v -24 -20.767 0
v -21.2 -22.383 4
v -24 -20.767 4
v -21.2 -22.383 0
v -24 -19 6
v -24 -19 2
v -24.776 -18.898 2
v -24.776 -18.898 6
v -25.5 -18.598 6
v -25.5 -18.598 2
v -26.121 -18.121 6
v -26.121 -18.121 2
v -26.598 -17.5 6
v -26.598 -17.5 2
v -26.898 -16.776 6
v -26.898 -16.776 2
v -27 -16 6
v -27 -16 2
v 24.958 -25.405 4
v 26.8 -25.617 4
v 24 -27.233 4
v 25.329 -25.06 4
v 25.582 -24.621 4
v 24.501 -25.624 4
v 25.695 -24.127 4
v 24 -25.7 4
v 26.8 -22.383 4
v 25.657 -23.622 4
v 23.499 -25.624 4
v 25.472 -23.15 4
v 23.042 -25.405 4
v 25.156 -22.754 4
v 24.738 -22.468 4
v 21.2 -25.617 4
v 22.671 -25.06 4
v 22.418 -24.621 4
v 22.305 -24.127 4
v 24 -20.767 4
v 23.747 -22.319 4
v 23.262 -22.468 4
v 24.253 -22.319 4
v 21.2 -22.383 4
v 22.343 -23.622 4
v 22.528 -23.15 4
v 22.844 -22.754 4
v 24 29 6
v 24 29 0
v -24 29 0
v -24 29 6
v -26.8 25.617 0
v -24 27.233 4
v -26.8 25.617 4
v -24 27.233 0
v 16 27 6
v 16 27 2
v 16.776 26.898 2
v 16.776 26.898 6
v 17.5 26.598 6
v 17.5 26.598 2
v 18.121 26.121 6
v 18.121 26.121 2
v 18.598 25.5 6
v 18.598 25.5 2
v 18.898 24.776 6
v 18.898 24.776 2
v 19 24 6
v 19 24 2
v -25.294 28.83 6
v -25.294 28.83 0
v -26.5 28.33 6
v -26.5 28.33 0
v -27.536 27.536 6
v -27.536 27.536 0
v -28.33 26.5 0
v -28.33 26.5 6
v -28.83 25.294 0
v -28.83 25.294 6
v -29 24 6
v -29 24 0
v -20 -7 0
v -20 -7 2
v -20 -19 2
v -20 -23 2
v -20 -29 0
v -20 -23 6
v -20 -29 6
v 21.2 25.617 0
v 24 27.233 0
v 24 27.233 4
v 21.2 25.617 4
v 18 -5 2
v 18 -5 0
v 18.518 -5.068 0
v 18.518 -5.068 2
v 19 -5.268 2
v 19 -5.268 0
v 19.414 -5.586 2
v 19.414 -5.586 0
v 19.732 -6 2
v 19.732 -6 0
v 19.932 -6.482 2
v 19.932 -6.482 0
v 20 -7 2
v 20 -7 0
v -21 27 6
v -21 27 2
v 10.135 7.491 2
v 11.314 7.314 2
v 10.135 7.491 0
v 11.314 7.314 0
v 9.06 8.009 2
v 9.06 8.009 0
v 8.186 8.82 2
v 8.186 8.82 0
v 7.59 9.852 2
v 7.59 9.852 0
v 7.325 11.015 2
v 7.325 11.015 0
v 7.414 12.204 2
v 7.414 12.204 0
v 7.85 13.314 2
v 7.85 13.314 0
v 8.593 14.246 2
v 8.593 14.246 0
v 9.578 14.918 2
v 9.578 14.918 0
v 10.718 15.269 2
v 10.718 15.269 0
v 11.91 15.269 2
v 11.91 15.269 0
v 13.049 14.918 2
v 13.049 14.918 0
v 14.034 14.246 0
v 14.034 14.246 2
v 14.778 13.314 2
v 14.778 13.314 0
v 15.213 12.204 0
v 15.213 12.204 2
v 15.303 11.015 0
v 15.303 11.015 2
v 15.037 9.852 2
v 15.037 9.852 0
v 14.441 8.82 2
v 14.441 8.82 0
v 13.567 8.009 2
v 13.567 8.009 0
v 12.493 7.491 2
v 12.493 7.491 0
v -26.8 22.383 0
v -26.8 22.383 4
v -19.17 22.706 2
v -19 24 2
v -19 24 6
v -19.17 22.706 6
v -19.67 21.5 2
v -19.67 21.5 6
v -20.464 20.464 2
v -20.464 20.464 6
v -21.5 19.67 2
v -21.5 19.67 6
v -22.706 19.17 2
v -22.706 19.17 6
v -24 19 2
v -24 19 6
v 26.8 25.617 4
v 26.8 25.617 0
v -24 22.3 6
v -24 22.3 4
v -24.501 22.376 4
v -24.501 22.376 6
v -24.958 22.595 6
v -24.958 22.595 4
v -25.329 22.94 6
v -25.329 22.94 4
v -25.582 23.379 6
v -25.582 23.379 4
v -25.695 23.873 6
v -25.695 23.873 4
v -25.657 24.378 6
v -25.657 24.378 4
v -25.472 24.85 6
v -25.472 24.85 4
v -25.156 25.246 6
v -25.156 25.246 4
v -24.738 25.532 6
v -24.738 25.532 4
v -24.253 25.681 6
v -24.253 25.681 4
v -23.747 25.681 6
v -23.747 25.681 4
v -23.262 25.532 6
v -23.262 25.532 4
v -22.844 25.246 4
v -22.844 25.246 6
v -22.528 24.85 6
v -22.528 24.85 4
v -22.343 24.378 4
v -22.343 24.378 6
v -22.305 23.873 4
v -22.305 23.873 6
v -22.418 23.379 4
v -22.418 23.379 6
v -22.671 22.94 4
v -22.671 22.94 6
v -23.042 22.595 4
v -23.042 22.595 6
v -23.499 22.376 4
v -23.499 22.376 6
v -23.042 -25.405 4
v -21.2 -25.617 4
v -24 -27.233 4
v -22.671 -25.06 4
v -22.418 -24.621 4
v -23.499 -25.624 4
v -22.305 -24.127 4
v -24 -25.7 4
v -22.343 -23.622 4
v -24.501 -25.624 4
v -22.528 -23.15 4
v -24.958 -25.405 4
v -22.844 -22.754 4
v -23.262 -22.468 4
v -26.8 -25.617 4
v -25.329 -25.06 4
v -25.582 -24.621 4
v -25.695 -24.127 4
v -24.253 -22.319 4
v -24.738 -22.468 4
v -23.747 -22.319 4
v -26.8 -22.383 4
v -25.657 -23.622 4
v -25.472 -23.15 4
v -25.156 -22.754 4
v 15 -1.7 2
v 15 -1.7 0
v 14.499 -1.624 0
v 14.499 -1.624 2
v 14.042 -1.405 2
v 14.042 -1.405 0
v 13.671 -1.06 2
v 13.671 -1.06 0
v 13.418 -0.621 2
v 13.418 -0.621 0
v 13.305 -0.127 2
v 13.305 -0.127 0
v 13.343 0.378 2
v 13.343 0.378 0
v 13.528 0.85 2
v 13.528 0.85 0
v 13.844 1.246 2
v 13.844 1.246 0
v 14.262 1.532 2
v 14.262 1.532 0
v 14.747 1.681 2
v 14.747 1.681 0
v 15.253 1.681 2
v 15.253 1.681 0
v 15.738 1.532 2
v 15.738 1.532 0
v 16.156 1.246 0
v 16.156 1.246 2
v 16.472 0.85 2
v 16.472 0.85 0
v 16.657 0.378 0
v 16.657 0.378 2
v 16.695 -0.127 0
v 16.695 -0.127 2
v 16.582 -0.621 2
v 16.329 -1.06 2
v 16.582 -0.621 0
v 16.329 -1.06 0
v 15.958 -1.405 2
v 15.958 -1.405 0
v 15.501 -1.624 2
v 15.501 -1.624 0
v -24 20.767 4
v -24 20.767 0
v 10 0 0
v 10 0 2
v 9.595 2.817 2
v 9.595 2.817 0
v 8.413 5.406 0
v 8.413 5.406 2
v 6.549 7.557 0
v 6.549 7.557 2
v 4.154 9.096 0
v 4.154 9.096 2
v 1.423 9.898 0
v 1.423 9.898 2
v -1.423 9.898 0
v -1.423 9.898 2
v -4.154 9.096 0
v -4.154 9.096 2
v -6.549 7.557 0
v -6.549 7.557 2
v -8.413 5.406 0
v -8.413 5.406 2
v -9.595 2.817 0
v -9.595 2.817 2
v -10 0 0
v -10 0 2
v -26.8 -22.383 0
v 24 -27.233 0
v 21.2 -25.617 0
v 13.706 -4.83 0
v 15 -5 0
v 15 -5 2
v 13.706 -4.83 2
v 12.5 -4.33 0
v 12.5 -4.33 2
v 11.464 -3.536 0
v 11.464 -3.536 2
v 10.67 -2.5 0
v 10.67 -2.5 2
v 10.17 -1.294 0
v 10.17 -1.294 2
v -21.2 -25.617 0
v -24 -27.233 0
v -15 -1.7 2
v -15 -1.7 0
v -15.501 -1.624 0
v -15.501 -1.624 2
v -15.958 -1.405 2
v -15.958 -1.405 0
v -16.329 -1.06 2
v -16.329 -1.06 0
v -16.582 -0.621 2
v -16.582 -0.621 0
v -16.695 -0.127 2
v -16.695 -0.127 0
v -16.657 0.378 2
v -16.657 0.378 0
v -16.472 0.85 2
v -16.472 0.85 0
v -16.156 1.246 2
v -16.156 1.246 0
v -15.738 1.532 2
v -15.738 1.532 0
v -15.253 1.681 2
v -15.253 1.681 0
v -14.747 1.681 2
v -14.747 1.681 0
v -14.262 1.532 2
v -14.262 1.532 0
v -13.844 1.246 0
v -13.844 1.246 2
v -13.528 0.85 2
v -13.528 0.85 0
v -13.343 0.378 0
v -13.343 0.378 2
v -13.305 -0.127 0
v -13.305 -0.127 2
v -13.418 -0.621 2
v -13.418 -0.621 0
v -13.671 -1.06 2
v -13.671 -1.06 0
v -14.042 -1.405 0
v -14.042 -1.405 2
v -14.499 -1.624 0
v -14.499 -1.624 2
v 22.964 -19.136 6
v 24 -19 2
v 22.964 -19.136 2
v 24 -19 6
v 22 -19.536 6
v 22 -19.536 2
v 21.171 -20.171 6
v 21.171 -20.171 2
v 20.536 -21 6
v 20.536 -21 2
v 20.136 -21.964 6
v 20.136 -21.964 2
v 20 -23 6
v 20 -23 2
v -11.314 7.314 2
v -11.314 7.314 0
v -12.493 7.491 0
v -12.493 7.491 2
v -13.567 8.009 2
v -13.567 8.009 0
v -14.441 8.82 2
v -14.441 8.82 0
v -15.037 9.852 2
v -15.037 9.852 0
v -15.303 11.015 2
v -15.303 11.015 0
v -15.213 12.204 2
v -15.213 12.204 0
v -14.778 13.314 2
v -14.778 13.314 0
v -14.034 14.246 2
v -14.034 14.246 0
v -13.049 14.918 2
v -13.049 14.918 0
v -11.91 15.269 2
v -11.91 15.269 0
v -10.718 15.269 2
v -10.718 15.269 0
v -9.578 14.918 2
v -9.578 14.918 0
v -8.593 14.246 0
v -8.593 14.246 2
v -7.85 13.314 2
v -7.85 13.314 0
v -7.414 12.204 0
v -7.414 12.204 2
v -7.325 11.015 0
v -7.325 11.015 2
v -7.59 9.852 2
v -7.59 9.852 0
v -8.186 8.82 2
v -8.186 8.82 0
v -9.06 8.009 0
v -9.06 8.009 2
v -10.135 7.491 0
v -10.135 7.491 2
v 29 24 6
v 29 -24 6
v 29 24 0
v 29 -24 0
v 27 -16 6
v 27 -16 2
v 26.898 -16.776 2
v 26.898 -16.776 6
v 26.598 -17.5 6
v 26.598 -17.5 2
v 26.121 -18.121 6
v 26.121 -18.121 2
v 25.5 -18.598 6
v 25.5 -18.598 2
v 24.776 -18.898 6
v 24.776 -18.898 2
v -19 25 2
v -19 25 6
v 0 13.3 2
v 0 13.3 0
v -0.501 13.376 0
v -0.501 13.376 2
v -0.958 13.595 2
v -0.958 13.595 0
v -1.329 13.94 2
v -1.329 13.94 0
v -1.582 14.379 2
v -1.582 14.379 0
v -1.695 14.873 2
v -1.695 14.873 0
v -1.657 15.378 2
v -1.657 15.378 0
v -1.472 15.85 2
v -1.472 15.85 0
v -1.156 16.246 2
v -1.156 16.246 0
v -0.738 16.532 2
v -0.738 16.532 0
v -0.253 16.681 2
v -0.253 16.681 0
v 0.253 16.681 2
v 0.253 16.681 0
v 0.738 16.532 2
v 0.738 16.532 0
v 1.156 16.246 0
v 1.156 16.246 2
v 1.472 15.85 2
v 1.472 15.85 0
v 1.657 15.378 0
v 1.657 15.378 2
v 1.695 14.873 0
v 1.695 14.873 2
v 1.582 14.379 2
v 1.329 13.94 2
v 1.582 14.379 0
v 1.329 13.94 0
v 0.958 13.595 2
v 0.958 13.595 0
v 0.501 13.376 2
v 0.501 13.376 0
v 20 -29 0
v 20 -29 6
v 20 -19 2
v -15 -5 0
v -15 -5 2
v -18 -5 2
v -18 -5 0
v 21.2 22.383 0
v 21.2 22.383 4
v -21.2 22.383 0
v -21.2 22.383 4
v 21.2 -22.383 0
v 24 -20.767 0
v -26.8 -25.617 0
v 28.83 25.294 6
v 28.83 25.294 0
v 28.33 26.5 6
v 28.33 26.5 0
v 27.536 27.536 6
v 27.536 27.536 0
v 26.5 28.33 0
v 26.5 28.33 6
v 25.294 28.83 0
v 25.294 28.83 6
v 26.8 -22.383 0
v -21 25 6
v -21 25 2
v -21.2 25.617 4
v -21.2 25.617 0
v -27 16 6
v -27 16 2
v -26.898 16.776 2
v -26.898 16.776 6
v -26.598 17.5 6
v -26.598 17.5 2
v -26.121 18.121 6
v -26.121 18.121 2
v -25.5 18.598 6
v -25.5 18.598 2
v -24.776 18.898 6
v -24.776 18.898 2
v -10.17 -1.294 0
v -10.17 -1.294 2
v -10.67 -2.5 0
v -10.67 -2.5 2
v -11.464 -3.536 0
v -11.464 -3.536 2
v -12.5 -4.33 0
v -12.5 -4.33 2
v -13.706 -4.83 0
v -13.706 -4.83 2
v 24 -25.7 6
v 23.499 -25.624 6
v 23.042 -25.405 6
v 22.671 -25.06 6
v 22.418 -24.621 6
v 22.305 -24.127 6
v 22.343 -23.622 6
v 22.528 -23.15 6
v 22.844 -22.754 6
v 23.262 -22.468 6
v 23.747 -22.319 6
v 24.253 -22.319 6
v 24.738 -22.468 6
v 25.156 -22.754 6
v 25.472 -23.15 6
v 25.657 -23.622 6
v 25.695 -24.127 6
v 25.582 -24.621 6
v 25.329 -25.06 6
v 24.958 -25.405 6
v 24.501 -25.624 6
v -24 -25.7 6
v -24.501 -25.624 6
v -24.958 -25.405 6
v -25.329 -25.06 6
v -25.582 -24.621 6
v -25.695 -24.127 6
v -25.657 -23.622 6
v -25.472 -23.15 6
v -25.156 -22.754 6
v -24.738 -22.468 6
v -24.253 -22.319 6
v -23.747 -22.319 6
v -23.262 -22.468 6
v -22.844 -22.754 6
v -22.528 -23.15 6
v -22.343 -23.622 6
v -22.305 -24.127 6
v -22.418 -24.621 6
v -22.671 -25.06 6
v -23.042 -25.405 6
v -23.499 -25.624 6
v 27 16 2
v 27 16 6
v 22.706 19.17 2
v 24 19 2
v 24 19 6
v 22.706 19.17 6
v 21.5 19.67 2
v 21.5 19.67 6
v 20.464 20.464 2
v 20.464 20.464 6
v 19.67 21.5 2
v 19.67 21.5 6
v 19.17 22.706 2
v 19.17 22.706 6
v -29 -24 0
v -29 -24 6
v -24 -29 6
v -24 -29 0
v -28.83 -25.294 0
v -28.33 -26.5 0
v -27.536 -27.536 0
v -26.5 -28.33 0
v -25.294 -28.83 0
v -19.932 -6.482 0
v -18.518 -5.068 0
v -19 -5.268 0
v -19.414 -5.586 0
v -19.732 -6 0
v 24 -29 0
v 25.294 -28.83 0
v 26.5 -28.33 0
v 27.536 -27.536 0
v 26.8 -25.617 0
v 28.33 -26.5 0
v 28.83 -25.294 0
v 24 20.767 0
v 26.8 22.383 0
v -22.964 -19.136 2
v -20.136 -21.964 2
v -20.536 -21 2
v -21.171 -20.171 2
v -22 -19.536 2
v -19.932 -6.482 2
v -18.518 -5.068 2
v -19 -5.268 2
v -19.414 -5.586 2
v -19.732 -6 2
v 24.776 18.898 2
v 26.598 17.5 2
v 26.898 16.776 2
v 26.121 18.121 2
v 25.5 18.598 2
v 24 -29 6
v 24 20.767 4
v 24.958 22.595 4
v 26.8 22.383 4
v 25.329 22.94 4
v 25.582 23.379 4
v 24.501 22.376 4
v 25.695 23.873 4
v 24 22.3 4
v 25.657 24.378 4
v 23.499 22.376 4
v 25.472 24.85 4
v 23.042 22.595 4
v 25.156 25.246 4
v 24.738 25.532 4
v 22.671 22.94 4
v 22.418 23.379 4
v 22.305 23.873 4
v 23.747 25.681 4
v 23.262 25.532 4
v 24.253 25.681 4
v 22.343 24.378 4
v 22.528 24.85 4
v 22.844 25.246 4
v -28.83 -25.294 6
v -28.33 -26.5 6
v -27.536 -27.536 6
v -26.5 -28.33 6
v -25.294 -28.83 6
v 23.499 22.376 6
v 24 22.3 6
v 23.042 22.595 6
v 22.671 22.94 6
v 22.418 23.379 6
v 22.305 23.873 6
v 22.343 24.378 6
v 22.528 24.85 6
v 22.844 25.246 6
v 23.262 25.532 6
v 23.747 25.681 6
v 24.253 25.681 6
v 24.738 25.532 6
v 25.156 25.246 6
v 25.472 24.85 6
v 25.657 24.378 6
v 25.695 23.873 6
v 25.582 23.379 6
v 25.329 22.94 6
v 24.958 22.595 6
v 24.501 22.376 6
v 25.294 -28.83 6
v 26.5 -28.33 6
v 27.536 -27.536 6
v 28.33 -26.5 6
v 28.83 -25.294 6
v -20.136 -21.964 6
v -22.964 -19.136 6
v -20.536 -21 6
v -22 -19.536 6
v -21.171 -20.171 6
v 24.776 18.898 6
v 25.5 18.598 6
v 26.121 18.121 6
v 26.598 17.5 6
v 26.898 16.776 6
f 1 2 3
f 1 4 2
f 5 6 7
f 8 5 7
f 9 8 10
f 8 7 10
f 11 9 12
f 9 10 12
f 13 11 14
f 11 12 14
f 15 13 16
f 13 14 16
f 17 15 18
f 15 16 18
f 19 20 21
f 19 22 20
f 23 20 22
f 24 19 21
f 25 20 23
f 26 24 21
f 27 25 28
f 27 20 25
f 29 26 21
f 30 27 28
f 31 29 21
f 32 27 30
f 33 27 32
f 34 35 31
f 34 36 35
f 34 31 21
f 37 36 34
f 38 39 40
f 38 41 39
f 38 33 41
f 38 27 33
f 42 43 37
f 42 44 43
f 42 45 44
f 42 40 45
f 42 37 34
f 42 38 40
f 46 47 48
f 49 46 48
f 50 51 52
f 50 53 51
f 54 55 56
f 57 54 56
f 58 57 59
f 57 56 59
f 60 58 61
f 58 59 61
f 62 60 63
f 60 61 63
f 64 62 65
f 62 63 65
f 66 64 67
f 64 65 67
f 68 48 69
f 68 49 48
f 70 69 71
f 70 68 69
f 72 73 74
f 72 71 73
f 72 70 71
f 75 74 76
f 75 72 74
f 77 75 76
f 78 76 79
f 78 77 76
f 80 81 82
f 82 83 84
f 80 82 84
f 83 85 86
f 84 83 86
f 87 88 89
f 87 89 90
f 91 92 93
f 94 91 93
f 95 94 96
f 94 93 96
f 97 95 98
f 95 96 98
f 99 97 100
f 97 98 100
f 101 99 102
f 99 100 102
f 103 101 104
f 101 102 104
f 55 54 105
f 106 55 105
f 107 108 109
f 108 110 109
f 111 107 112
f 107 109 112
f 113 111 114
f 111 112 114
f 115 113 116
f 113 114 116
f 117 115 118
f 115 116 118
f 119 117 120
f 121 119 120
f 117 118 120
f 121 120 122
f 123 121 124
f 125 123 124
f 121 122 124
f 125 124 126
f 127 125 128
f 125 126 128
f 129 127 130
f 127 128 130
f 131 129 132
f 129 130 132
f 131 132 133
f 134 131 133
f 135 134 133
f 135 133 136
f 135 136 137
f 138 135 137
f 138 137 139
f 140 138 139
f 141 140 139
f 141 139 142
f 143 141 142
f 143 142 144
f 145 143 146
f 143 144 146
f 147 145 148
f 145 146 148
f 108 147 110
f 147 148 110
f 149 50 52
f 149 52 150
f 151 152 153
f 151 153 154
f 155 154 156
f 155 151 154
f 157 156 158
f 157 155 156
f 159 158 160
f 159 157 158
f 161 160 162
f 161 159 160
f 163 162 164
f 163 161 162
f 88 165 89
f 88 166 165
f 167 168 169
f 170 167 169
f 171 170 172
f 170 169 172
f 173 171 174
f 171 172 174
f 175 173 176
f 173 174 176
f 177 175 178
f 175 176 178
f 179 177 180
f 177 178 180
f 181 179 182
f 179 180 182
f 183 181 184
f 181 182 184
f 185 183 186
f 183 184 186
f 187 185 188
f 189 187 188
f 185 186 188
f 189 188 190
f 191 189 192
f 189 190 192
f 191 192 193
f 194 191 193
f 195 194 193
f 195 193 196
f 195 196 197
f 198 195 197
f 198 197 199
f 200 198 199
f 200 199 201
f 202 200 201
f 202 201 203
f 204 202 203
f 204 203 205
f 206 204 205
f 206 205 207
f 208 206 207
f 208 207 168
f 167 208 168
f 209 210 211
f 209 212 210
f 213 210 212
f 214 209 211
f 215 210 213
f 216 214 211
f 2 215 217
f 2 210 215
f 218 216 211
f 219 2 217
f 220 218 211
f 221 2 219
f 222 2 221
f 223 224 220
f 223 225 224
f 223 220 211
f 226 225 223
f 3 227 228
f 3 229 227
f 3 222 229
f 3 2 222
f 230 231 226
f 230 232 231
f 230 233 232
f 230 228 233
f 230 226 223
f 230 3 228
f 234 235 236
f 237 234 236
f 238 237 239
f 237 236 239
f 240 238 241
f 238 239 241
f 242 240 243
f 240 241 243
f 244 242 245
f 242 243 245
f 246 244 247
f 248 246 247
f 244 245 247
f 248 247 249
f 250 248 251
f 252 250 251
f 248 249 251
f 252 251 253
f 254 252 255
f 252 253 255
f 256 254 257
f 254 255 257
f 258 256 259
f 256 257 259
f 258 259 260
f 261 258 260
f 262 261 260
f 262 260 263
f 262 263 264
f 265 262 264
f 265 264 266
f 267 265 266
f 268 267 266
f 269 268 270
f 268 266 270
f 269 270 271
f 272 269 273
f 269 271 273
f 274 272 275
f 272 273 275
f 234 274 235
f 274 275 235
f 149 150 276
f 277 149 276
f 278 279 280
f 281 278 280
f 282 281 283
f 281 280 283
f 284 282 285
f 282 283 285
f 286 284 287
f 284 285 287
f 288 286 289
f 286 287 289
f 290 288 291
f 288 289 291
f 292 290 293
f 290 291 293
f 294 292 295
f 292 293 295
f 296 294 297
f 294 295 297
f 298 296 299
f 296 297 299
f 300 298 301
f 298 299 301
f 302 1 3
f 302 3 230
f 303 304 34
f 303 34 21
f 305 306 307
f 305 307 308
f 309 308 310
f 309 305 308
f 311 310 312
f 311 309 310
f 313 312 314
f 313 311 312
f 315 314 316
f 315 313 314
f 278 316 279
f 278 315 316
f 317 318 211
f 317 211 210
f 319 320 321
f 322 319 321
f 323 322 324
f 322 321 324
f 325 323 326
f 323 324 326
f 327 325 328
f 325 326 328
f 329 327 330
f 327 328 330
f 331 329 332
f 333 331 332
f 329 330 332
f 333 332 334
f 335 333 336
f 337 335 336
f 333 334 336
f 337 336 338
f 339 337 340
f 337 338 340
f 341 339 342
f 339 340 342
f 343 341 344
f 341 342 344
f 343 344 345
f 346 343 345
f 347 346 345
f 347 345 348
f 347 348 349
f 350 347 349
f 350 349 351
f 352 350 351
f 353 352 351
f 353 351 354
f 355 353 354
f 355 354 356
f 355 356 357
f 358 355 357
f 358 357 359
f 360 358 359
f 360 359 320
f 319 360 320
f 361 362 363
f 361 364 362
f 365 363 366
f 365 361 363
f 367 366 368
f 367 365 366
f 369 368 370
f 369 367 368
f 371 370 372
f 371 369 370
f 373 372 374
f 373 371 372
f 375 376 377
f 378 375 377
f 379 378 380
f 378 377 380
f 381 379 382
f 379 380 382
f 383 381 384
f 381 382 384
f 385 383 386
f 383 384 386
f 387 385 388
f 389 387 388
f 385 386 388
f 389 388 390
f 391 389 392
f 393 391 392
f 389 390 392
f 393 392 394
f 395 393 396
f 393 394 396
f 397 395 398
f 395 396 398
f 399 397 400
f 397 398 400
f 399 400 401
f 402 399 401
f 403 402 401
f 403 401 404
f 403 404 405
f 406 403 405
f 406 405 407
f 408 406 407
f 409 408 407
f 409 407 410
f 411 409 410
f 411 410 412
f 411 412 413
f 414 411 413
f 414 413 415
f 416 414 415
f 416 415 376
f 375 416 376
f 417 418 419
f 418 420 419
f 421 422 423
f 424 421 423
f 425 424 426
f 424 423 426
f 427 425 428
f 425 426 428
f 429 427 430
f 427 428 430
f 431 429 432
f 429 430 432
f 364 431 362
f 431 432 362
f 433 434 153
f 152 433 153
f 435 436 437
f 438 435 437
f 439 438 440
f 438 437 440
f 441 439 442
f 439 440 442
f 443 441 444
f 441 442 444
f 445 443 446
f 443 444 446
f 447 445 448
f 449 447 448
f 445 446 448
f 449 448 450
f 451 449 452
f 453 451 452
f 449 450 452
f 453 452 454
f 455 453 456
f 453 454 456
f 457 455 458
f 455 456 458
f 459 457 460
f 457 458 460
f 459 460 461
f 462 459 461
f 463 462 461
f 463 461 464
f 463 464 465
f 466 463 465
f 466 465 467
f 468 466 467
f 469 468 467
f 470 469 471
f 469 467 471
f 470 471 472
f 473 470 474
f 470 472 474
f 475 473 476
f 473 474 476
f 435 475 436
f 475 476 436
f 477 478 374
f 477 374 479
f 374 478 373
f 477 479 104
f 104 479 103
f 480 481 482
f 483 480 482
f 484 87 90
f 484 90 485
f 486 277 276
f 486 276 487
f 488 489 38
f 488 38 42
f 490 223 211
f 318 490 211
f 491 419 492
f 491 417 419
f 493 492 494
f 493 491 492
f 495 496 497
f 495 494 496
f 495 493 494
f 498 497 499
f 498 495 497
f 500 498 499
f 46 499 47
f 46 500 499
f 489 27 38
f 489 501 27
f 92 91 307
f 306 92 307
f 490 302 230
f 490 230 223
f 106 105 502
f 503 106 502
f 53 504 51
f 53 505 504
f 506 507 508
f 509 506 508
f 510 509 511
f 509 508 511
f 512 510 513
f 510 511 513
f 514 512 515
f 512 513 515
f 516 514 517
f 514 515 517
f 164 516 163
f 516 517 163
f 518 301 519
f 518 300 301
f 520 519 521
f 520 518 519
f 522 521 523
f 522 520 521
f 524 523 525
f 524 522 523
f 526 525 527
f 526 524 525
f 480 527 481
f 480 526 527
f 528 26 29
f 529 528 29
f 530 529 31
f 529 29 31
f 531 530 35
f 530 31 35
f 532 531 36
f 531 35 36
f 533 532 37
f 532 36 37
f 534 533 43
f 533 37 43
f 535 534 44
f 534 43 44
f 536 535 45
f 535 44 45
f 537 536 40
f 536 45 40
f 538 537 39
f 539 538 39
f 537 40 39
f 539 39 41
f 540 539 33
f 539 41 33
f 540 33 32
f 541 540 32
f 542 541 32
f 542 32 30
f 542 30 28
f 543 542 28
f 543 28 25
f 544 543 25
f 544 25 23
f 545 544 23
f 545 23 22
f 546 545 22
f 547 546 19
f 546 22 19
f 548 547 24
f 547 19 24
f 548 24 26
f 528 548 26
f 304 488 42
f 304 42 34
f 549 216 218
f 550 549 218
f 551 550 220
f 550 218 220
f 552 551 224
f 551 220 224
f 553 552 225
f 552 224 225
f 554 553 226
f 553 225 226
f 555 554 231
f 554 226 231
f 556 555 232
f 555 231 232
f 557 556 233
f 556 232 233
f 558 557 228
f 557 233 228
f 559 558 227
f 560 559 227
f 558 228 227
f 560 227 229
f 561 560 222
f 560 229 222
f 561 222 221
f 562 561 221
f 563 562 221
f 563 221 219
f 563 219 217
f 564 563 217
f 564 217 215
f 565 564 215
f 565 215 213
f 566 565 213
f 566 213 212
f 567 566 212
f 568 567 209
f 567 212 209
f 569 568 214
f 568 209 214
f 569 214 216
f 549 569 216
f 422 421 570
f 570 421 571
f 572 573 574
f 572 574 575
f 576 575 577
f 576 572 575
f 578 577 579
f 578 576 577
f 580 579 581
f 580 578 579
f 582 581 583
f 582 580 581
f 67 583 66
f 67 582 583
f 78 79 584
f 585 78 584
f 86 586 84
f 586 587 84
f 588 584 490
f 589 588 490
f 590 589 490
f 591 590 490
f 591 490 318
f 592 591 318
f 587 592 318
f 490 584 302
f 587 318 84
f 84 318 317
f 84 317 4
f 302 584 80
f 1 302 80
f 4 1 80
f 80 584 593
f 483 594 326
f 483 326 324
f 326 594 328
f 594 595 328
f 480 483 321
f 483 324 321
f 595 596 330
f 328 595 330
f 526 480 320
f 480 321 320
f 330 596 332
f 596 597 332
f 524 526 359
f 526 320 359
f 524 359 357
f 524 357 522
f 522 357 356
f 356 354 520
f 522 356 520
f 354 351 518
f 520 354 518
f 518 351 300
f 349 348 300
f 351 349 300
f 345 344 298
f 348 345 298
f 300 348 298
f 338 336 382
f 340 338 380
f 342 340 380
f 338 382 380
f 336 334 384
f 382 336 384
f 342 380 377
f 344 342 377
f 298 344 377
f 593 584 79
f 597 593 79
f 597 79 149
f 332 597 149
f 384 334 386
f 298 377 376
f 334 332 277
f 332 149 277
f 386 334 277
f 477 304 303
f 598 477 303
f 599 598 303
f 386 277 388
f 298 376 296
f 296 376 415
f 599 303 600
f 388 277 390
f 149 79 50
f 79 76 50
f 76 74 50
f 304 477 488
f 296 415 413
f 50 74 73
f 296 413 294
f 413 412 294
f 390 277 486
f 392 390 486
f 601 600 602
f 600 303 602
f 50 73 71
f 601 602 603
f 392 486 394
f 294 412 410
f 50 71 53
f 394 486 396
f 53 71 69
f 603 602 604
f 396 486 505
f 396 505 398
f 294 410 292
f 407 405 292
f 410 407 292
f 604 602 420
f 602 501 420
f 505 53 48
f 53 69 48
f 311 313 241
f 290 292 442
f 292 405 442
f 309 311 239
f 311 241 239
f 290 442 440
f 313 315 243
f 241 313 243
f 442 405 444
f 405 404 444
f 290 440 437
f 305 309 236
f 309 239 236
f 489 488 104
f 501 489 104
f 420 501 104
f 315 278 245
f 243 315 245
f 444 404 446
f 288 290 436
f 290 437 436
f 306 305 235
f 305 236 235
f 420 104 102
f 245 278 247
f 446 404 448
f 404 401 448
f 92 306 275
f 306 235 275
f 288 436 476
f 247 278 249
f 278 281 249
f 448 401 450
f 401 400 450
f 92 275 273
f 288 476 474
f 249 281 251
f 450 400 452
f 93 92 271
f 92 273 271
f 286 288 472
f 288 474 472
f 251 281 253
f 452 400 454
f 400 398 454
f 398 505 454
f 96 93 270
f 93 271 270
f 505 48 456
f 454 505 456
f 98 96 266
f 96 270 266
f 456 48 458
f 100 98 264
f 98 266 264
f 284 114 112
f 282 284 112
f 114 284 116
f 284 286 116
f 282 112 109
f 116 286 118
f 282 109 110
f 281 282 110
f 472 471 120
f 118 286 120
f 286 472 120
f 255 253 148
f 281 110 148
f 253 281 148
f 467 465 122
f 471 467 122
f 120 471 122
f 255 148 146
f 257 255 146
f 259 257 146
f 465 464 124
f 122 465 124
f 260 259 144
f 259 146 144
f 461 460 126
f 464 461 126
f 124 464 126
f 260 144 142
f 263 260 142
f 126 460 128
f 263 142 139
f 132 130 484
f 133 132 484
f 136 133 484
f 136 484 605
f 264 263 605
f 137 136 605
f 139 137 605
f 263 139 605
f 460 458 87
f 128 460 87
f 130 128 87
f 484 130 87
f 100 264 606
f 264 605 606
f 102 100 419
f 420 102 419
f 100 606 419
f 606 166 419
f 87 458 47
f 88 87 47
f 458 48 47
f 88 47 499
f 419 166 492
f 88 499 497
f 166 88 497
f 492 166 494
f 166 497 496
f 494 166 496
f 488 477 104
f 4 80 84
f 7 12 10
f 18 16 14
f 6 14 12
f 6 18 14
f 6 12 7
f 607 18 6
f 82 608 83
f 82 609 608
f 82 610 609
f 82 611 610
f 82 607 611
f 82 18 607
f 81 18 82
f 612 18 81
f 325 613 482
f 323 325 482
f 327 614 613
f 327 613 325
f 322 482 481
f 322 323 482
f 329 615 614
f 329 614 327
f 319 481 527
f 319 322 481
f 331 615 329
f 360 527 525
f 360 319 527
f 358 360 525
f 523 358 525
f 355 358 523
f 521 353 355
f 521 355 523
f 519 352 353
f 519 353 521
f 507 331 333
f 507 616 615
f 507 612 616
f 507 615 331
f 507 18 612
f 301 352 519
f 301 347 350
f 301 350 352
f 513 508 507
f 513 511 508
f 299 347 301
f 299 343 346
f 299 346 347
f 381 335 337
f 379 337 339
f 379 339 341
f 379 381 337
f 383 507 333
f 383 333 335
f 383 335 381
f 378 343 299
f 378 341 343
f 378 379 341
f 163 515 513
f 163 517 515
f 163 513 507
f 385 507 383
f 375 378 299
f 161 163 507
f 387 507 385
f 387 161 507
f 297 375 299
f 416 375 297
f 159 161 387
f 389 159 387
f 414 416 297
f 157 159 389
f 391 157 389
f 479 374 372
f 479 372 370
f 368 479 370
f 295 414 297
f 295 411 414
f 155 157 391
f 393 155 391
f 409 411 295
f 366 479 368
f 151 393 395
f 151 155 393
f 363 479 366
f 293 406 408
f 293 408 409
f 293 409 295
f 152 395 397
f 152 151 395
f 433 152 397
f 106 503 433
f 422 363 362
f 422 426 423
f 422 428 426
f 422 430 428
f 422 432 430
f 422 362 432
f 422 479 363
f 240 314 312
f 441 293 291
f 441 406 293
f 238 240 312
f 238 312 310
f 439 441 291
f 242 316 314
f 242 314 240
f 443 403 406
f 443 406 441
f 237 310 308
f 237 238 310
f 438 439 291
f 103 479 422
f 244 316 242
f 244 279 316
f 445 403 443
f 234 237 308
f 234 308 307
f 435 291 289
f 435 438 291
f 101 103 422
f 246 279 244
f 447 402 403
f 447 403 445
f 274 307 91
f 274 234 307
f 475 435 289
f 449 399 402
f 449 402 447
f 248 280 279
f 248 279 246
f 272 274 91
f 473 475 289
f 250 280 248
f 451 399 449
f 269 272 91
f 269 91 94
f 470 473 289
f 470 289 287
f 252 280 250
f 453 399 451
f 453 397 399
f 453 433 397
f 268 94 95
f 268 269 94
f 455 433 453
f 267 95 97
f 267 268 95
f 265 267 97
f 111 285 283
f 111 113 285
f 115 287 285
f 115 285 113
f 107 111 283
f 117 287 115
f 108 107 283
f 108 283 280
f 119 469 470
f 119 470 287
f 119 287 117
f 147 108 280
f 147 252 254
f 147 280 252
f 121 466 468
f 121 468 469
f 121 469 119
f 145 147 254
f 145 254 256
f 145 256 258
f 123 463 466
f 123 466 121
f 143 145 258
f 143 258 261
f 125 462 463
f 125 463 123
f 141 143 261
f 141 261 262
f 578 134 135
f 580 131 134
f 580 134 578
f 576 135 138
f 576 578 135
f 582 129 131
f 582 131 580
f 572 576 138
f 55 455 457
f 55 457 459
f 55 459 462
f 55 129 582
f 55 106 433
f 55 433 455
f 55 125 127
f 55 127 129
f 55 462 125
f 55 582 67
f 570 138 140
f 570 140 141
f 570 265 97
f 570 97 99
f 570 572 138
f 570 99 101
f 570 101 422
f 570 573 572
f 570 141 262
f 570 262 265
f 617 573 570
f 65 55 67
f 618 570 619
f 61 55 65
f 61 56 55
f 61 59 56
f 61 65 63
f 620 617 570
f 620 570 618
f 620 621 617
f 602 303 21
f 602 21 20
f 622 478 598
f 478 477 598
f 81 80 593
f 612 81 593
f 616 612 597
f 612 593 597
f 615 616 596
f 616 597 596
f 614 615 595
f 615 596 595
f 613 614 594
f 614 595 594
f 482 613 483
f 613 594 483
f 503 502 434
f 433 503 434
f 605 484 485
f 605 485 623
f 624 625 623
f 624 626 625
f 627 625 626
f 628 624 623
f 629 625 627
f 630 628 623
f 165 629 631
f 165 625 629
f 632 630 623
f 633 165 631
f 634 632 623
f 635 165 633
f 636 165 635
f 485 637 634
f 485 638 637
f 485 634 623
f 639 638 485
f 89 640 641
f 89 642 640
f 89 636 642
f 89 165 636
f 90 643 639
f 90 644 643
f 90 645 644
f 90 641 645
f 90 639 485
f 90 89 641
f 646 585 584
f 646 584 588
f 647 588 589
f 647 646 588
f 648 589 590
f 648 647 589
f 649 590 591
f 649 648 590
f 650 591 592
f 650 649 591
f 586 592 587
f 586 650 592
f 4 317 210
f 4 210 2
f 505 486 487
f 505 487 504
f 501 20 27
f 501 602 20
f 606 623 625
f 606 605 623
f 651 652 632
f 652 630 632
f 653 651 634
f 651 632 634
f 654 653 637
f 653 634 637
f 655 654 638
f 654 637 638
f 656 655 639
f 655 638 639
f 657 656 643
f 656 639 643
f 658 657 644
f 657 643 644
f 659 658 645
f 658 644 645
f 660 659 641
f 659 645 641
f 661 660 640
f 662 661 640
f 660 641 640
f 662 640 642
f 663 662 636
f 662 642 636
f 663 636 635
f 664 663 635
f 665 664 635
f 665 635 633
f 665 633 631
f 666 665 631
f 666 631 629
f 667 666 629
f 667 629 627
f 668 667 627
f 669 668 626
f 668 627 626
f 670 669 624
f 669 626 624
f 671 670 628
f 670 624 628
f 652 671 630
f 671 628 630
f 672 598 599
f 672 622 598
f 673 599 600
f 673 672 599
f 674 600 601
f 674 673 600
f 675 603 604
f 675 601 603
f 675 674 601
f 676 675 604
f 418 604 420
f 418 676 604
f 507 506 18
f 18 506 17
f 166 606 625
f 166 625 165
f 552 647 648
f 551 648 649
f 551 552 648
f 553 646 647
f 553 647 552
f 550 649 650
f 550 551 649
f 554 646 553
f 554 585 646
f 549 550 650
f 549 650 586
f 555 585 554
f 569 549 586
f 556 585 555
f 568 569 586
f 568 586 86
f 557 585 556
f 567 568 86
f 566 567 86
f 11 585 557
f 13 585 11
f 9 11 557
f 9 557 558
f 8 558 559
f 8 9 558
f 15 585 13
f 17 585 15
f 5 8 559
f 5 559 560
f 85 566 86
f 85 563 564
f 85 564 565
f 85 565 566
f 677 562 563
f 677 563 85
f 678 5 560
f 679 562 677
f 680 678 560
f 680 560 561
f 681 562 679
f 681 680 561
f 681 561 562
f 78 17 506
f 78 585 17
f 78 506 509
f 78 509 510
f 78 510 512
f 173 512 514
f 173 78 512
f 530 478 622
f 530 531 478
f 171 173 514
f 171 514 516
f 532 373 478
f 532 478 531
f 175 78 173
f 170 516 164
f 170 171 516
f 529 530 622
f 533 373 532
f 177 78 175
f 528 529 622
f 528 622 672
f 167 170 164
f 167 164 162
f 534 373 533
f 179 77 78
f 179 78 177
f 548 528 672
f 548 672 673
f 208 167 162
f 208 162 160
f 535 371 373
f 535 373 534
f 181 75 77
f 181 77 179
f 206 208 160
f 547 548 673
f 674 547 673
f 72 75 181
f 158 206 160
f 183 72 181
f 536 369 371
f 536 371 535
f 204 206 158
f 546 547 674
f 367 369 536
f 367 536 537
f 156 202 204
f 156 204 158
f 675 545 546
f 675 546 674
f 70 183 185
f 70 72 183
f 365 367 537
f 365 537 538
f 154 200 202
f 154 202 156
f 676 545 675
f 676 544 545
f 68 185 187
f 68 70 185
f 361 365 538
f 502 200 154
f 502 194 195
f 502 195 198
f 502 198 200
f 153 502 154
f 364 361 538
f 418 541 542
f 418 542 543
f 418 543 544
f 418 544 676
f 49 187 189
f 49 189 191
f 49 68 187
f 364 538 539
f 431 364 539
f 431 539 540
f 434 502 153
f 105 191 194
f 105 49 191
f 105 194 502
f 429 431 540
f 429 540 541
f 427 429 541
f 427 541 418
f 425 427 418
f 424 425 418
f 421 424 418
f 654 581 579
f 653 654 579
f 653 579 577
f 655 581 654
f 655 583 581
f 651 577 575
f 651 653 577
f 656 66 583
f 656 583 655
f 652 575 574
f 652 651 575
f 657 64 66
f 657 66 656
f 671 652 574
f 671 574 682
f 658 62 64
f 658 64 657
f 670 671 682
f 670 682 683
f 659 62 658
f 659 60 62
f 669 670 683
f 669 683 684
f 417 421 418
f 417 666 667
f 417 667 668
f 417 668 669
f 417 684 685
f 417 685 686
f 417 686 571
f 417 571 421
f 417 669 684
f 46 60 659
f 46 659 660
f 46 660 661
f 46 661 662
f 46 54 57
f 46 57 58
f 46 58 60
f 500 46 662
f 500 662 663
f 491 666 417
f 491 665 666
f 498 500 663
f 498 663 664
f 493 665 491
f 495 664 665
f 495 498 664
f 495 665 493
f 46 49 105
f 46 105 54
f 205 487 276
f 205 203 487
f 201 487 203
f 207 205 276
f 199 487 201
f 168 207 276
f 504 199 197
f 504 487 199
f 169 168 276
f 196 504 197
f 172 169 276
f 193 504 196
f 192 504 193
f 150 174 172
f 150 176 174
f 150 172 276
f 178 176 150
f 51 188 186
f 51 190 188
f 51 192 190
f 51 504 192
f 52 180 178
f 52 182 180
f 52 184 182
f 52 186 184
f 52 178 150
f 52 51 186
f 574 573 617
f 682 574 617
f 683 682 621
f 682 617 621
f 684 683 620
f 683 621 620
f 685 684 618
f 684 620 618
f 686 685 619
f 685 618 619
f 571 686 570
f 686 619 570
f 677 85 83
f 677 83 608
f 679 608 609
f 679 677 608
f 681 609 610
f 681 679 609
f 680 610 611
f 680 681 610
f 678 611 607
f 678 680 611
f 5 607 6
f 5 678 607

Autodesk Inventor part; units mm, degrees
ref_plane "YZ Plane" through (0, 0, 0) normal (1, 0, 0) x (0, 1, 0)
ref_plane "XZ Plane" through (0, 0, 0) normal (0, 1, 0) x (-1, 0, 0)
ref_plane "XY Plane" through (0, 0, 0) normal (0, 0, 1) x (1, 0, 0)
sketch "スケッチ1" plane through (0, 0, 0) normal (0, 0, 1) x (1, 0, 0)
  line L0 (-29, -29) -> (29, -29)
  line L1 (29, -29) -> (29, 29)
  line L2 (29, 29) -> (-29, 29)
  line L3 (-29, 29) -> (-29, -29)
  line L4 (-29, -29) -> (29, 29) construction
  line L5 (29, -29) -> (-29, 29) construction
  point P0 (0, 0)
  dimension "d0" = 58
  dimension "d1" = 58
extrude "押し出し1" add sketch "スケッチ1" along normal blind 6
fillet "フィレット1" radius 5 4 edges at (-29, 29, 3) (29, 29, 3) (29, -29, 3) (-29, -29, 3)
sketch "スケッチ4" plane through (0, 0, 6) normal (0, 0, 1) x (1, 0, 0)
  arc A0 (-29, -24) -> (-24, -29) centre (-24, -24) ccw projected
  line L0 (-24, -29) -> (24, -29) projected
  arc A1 (24, -29) -> (29, -24) centre (24, -24) ccw projected
  line L1 (29, -24) -> (29, 24) projected
  arc A2 (29, 24) -> (24, 29) centre (24, 24) ccw projected
  line L2 (24, 29) -> (-24, 29) projected
  arc A3 (-24, 29) -> (-29, 24) centre (-24, 24) ccw projected
  line L3 (-29, 24) -> (-29, -24) projected
  line L4 (-27, -27) -> (27, -27)
  line L5 (27, -27) -> (27, 27)
  line L6 (27, 27) -> (-27, 27)
  line L7 (-27, 27) -> (-27, -27)
  line L8 (-27, -27) -> (27, 27) construction
  line L9 (27, -27) -> (-27, 27) construction
  line L10 (-24, -24) -> (24, -24) construction
  line L11 (24, -24) -> (24, 24) construction
  line L12 (24, 24) -> (-24, 24) construction
  line L13 (-24, 24) -> (-24, -24) construction
  line L14 (-24, -24) -> (24, 24) construction
  line L15 (24, -24) -> (-24, 24) construction
  line L16 (24, 29) -> (-24, 29) projected
  circle A4 centre (-24, 24) radius 5
  circle A5 centre (24, 24) radius 5
  arc A6 (24, -29) -> (29, -24) centre (24, -24) ccw projected
  circle A7 centre (24, -24) radius 5
  line L17 (-24, -29) -> (24, -29) projected
  circle A8 centre (-24, -24) radius 5
  line L18 (-29, 29) -> (-19, 29)
  line L19 (-19, 29) -> (-19, 19)
  line L20 (-19, 19) -> (-29, 19)
  line L21 (-29, 19) -> (-29, 29)
  line L22 (-29, 29) -> (-19, 19) construction
  line L23 (-19, 29) -> (-29, 19) construction
  line L24 (29, 29) -> (19, 29)
  line L25 (19, 29) -> (19, 19)
  line L26 (19, 19) -> (29, 19)
  line L27 (29, 19) -> (29, 29)
  line L28 (29, 29) -> (19, 19) construction
  line L29 (19, 29) -> (29, 19) construction
  line L30 (29, -29) -> (19, -29)
  line L31 (19, -29) -> (19, -19)
  line L32 (19, -19) -> (29, -19)
  line L33 (29, -19) -> (29, -29)
  line L34 (29, -29) -> (19, -19) construction
  line L35 (19, -29) -> (29, -19) construction
  line L36 (-29, -29) -> (-19, -29)
  line L37 (-19, -29) -> (-19, -19)
  line L38 (-19, -19) -> (-29, -19)
  line L39 (-29, -19) -> (-29, -29)
  line L40 (-29, -29) -> (-19, -19) construction
  line L41 (-19, -29) -> (-29, -19) construction
  point P0 (0, 0)
  point P1 (-20, -27)
  point P2 (20, -27)
  point P3 (27, -20)
  point P4 (27, 20)
  point P5 (20, 27)
  point P6 (-20, 27)
  point P7 (-27, 20)
  point P8 (-27, -20)
  point P9 (-19, -24)
  point P10 (-19, -27)
  point P11 (19, -27)
  point P12 (19, -24)
  point P13 (24, -19)
  point P14 (27, -19)
  point P15 (27, 19)
  point P16 (24, 19)
  point P17 (19, 24)
  point P18 (19, 27)
  point P19 (-19, 27)
  point P20 (-19, 24)
  point P21 (-24, 19)
  point P22 (-27, 19)
  point P23 (-27, -19)
  point P24 (-24, -19)
  dimension "d77" = 54
  dimension "d78" = 54
  dimension "d79" = 48
  dimension "d80" = 48
  dimension "d81" = 10
  dimension "d82" = 10
  dimension "d83" = 10
  dimension "d84" = 10
  dimension "d85" = 10
  dimension "d86" = 10
  dimension "d87" = 10
  dimension "d88" = 10
  dimension "d89" = 10
  dimension "d90" = 10
  dimension "d91" = 10
  dimension "d92" = 10
extrude "押し出し2" cut sketch "スケッチ4" against normal blind 4 contours L7 L20 L19 L6 L25 L26 L5 L32 L31 L4 L37 L38
sketch "スケッチ5" plane through (0, 0, 2) normal (0, 0, 1) x (1, 0, 0)
  circle A0 centre (0, 0) radius 16
  point P0 (-11.3137, 11.3137)
  point P1 (-11.3137, -11.3137)
  point P2 (11.3137, -11.3137)
  point P3 (11.3137, 11.3137)
  dimension "d18" = 32
  dimension "d21" = 360
  dimension "d58" = 0
hole "穴2" at (-11.3137, 11.3137, 2) at (-11.3137, -11.3137, 2) at (11.3137, -11.3137, 2) at (11.3137, 11.3137, 2) direction (0, 0, -1) diameter 4.5 depth 11.8 tip angle 118 counterbore diameter 8 counterbore depth 4 clearance for "Socket Head Cap Screw" size "M4" standard "Ansi Metric M Profile"
sketch "スケッチ6" plane through (0, 0, 2) normal (0, 0, 1) x (1, 0, 0)
  circle A0 centre (0, 0) radius 15
  point P0 (0, 15)
  point P1 (-15, 0)
  point P2 (0, -15)
  point P3 (15, 0)
  dimension "d30" = 30
  dimension "d33" = 360
  dimension "d59" = 0
hole "穴3" at (15, 0, 2) at (0, 15, 2) at (-15, 0, 2) direction (0, 0, -1) diameter 3.4 depth 11.8 tip angle 118 clearance for "Socket Head Cap Screw" size "M3" standard "Ansi Metric M Profile"
fillet "フィレット5" radius 3 8 edges at (-27, 19, 4) (-19, 27, 4) (19, 27, 4) (27, 19, 4) (27, -19, 4) (19, -27, 4) (-19, -27, 4) (-27, -19, 4)
sketch "スケッチ7" plane through (0, 0, 2) normal (0, 0, 1) x (1, 0, 0)
  circle A0 centre (0, 0) radius 10
  dimension "d42" = 20
extrude "押し出し3" cut sketch "スケッチ7" against normal through all
sketch "スケッチ8" plane through (0, 0, 6) normal (0, 0, 1) x (1, 0, 0)
  line L0 (24, -24) -> (-24, -24)
  line L1 (-24, -24) -> (-24, 24)
  line L2 (-24, 24) -> (24, 24)
  line L3 (24, 24) -> (24, -24)
  line L4 (24, -24) -> (-24, 24) construction
  line L5 (-24, -24) -> (24, 24) construction
  point P0 (0, 0)
  dimension "d45" = 48
  dimension "d46" = 48
hole "穴4" at (-24, 24, 6) at (-24, -24, 6) at (24, -24, 6) at (24, 24, 6) direction (0, 0, -1) diameter 3.4 depth 6 tip angle 118 clearance for "Flat Head Machine Screw" size "M3" standard "Ansi Metric M Profile"
sketch "スケッチ9" plane through (0, 0, 6) normal (0, 0, 1) x (1, 0, 0)
  line L0 (-20, -29) -> (20, -29)
  line L1 (20, -29) -> (20, -5)
  line L2 (20, -5) -> (-20, -5)
  line L3 (-20, -5) -> (-20, -29)
  line L4 (-20, -29) -> (20, -5) construction
  line L5 (20, -29) -> (-20, -5) construction
  line L6 (-24, -29) -> (24, -29) projected
  circle A0 centre (11.3137, -11.3137) radius 4 projected
  line L7 (10, 5) -> (-10, 5)
  line L8 (-10, 5) -> (-10, -5)
  line L9 (-10, -5) -> (10, -5)
  line L10 (10, -5) -> (10, 5)
  line L11 (10, 5) -> (-10, -5) construction
  line L12 (-10, 5) -> (10, -5) construction
  circle A1 centre (0, 0) radius 10 projected
  line L13 (-10, 0) -> (10, 0)
  point P0 (0, -17)
  point P1 (0, -17)
  point P2 (8.6603, -5)
  point P3 (-8.6603, -5)
  point P4 (-15, 0)
  dimension "d54" = 40
  dimension "d64" = 5
extrude "押し出し4" cut sketch "スケッチ9" against normal through all contours L3 L2 A1 L1 L0 | L8 A1 L2 | L2 A1 L10 | L2 A1 | A0
fillet "フィレット7" radius 5 2 edges at (-10, -5, 1) (10, -5, 1)
fillet "フィレット8" radius 2 2 edges at (-20, -5, 1) (20, -5, 1)
sketch "スケッチ11" plane through (0, 0, 0) normal (0, 0, -1) x (-1, 0, 0)
  circle A0 centre (24, 24) radius 1.7 projected
  circle A1 centre (24, -24) radius 1.7 projected
  circle A2 centre (-24, 24) radius 1.7 projected
  circle A3 centre (-24, -24) radius 1.7 projected
  line L0 (26.8, 25.6166) -> (26.8, 22.3834)
  line L1 (26.8, 22.3834) -> (24, 20.7668)
  line L2 (24, 20.7668) -> (21.2, 22.3834)
  line L3 (21.2, 22.3834) -> (21.2, 25.6166)
  line L4 (21.2, 25.6166) -> (24, 27.2332)
  line L5 (24, 27.2332) -> (26.8, 25.6166)
  line L6 (-24, 29) -> (24, 29) projected
  line L7 (21.2, -25.6166) -> (21.2, -22.3834)
  line L8 (21.2, -22.3834) -> (24, -20.7668)
  line L9 (24, -20.7668) -> (26.8, -22.3834)
  line L10 (26.8, -22.3834) -> (26.8, -25.6166)
  line L11 (26.8, -25.6166) -> (24, -27.2332)
  line L12 (24, -27.2332) -> (21.2, -25.6166)
  line L13 (-21.2, 25.6166) -> (-21.2, 22.3834)
  line L14 (-21.2, 22.3834) -> (-24, 20.7668)
  line L15 (-24, 20.7668) -> (-26.8, 22.3834)
  line L16 (-26.8, 22.3834) -> (-26.8, 25.6166)
  line L17 (-26.8, 25.6166) -> (-24, 27.2332)
  line L18 (-24, 27.2332) -> (-21.2, 25.6166)
  line L19 (24, -29) -> (20, -29) projected
  line L20 (-21.2, -22.3834) -> (-21.2, -25.6166)
  line L21 (-21.2, -25.6166) -> (-24, -27.2332)
  line L22 (-24, -27.2332) -> (-26.8, -25.6166)
  line L23 (-26.8, -25.6166) -> (-26.8, -22.3834)
  line L24 (-26.8, -22.3834) -> (-24, -20.7668)
  line L25 (-24, -20.7668) -> (-21.2, -22.3834)
  arc A4 (-29, -24) -> (-24, -29) centre (-24, -24) ccw projected
  line L26 (-20, -29) -> (-24, -29) projected
  line L27 (-29, -24) -> (-24, -29)
  point P0 (0, 0)
  point P1 (-25.8144, -26.1856)
  point P2 (-26.8, -25.2)
  dimension "d31" = 4
  dimension "d67" = 5.6
  dimension "d68" = 30
  dimension "d69" = 5.6
  dimension "d70" = 30
  dimension "d71" = 30
  dimension "d72" = 5.6
  dimension "d73" = 15
  dimension "d74" = 5.6
extrude "押し出し5" cut sketch "スケッチ11" against normal blind 4 contours A0 | A1 | A2 | A3 | L0 L1 L2 L3 L4 L5 | L7 L8 L9 L10 L11 L12 | L13 L14 L15 L16 L17 L18 | L20 L21 L22 L23 L24 L25
sketch "スケッチ12" plane through (0, 0, 6) normal (0, 0, 1) x (1, 0, 0)
  line L0 (-21, 25) -> (-3.9723, 25)
  line L1 (-3.9723, 25) -> (-3.9723, 27)
  line L2 (-3.9723, 27) -> (-21, 27)
  line L3 (-21, 27) -> (-21, 25)
  line L4 (-21, 25) -> (-3.9723, 27) construction
  line L5 (-3.9723, 25) -> (-21, 27) construction
  line L6 (24, 29) -> (-24, 29) projected
  line L7 (29, -24) -> (29, 24) projected
  line L8 (-29, 24) -> (-29, -24) projected
  line L9 (-19, 19) -> (-19, 24) projected
  line L10 (-19, 24) -> (-17.5063, 24)
  line L11 (-17.5063, 24) -> (-17.5063, 25)
  line L12 (-17.5063, 25) -> (-19, 25)
  line L13 (-19, 25) -> (-19, 24)
  point P0 (0, 0)
  point P1 (-12.4862, 26)
  point P2 (29, -19)
  dimension "d93" = 3
  dimension "d98" = 8
  dimension "d99" = 2
extrude "押し出し6" cut sketch "スケッチ12" against normal up to surface (4 mm away)
fillet "フィレット9" radius 4 2 edges at (-20, -19, 4) (20, -19, 4)
fillet "フィレット10" radius 5 2 edges at (19, 19, 4) (-19, 19, 4)
equation "\"d0\" = d1"
equation "\"d78\" = d77"
equation "\"d81\" = d89"
equation "\"d82\" = d89"
equation "\"d83\" = d90"
equation "\"d84\" = d90"
equation "\"d85\" = d92"
equation "\"d86\" = d92"
equation "\"d87\" = d91"
equation "\"d88\" = d91"
equation "\"d89\" = d90"
equation "\"d91\" = d89"
equation "\"d92\" = d91"
properties part number "base47" material "ABS プラスチック"
